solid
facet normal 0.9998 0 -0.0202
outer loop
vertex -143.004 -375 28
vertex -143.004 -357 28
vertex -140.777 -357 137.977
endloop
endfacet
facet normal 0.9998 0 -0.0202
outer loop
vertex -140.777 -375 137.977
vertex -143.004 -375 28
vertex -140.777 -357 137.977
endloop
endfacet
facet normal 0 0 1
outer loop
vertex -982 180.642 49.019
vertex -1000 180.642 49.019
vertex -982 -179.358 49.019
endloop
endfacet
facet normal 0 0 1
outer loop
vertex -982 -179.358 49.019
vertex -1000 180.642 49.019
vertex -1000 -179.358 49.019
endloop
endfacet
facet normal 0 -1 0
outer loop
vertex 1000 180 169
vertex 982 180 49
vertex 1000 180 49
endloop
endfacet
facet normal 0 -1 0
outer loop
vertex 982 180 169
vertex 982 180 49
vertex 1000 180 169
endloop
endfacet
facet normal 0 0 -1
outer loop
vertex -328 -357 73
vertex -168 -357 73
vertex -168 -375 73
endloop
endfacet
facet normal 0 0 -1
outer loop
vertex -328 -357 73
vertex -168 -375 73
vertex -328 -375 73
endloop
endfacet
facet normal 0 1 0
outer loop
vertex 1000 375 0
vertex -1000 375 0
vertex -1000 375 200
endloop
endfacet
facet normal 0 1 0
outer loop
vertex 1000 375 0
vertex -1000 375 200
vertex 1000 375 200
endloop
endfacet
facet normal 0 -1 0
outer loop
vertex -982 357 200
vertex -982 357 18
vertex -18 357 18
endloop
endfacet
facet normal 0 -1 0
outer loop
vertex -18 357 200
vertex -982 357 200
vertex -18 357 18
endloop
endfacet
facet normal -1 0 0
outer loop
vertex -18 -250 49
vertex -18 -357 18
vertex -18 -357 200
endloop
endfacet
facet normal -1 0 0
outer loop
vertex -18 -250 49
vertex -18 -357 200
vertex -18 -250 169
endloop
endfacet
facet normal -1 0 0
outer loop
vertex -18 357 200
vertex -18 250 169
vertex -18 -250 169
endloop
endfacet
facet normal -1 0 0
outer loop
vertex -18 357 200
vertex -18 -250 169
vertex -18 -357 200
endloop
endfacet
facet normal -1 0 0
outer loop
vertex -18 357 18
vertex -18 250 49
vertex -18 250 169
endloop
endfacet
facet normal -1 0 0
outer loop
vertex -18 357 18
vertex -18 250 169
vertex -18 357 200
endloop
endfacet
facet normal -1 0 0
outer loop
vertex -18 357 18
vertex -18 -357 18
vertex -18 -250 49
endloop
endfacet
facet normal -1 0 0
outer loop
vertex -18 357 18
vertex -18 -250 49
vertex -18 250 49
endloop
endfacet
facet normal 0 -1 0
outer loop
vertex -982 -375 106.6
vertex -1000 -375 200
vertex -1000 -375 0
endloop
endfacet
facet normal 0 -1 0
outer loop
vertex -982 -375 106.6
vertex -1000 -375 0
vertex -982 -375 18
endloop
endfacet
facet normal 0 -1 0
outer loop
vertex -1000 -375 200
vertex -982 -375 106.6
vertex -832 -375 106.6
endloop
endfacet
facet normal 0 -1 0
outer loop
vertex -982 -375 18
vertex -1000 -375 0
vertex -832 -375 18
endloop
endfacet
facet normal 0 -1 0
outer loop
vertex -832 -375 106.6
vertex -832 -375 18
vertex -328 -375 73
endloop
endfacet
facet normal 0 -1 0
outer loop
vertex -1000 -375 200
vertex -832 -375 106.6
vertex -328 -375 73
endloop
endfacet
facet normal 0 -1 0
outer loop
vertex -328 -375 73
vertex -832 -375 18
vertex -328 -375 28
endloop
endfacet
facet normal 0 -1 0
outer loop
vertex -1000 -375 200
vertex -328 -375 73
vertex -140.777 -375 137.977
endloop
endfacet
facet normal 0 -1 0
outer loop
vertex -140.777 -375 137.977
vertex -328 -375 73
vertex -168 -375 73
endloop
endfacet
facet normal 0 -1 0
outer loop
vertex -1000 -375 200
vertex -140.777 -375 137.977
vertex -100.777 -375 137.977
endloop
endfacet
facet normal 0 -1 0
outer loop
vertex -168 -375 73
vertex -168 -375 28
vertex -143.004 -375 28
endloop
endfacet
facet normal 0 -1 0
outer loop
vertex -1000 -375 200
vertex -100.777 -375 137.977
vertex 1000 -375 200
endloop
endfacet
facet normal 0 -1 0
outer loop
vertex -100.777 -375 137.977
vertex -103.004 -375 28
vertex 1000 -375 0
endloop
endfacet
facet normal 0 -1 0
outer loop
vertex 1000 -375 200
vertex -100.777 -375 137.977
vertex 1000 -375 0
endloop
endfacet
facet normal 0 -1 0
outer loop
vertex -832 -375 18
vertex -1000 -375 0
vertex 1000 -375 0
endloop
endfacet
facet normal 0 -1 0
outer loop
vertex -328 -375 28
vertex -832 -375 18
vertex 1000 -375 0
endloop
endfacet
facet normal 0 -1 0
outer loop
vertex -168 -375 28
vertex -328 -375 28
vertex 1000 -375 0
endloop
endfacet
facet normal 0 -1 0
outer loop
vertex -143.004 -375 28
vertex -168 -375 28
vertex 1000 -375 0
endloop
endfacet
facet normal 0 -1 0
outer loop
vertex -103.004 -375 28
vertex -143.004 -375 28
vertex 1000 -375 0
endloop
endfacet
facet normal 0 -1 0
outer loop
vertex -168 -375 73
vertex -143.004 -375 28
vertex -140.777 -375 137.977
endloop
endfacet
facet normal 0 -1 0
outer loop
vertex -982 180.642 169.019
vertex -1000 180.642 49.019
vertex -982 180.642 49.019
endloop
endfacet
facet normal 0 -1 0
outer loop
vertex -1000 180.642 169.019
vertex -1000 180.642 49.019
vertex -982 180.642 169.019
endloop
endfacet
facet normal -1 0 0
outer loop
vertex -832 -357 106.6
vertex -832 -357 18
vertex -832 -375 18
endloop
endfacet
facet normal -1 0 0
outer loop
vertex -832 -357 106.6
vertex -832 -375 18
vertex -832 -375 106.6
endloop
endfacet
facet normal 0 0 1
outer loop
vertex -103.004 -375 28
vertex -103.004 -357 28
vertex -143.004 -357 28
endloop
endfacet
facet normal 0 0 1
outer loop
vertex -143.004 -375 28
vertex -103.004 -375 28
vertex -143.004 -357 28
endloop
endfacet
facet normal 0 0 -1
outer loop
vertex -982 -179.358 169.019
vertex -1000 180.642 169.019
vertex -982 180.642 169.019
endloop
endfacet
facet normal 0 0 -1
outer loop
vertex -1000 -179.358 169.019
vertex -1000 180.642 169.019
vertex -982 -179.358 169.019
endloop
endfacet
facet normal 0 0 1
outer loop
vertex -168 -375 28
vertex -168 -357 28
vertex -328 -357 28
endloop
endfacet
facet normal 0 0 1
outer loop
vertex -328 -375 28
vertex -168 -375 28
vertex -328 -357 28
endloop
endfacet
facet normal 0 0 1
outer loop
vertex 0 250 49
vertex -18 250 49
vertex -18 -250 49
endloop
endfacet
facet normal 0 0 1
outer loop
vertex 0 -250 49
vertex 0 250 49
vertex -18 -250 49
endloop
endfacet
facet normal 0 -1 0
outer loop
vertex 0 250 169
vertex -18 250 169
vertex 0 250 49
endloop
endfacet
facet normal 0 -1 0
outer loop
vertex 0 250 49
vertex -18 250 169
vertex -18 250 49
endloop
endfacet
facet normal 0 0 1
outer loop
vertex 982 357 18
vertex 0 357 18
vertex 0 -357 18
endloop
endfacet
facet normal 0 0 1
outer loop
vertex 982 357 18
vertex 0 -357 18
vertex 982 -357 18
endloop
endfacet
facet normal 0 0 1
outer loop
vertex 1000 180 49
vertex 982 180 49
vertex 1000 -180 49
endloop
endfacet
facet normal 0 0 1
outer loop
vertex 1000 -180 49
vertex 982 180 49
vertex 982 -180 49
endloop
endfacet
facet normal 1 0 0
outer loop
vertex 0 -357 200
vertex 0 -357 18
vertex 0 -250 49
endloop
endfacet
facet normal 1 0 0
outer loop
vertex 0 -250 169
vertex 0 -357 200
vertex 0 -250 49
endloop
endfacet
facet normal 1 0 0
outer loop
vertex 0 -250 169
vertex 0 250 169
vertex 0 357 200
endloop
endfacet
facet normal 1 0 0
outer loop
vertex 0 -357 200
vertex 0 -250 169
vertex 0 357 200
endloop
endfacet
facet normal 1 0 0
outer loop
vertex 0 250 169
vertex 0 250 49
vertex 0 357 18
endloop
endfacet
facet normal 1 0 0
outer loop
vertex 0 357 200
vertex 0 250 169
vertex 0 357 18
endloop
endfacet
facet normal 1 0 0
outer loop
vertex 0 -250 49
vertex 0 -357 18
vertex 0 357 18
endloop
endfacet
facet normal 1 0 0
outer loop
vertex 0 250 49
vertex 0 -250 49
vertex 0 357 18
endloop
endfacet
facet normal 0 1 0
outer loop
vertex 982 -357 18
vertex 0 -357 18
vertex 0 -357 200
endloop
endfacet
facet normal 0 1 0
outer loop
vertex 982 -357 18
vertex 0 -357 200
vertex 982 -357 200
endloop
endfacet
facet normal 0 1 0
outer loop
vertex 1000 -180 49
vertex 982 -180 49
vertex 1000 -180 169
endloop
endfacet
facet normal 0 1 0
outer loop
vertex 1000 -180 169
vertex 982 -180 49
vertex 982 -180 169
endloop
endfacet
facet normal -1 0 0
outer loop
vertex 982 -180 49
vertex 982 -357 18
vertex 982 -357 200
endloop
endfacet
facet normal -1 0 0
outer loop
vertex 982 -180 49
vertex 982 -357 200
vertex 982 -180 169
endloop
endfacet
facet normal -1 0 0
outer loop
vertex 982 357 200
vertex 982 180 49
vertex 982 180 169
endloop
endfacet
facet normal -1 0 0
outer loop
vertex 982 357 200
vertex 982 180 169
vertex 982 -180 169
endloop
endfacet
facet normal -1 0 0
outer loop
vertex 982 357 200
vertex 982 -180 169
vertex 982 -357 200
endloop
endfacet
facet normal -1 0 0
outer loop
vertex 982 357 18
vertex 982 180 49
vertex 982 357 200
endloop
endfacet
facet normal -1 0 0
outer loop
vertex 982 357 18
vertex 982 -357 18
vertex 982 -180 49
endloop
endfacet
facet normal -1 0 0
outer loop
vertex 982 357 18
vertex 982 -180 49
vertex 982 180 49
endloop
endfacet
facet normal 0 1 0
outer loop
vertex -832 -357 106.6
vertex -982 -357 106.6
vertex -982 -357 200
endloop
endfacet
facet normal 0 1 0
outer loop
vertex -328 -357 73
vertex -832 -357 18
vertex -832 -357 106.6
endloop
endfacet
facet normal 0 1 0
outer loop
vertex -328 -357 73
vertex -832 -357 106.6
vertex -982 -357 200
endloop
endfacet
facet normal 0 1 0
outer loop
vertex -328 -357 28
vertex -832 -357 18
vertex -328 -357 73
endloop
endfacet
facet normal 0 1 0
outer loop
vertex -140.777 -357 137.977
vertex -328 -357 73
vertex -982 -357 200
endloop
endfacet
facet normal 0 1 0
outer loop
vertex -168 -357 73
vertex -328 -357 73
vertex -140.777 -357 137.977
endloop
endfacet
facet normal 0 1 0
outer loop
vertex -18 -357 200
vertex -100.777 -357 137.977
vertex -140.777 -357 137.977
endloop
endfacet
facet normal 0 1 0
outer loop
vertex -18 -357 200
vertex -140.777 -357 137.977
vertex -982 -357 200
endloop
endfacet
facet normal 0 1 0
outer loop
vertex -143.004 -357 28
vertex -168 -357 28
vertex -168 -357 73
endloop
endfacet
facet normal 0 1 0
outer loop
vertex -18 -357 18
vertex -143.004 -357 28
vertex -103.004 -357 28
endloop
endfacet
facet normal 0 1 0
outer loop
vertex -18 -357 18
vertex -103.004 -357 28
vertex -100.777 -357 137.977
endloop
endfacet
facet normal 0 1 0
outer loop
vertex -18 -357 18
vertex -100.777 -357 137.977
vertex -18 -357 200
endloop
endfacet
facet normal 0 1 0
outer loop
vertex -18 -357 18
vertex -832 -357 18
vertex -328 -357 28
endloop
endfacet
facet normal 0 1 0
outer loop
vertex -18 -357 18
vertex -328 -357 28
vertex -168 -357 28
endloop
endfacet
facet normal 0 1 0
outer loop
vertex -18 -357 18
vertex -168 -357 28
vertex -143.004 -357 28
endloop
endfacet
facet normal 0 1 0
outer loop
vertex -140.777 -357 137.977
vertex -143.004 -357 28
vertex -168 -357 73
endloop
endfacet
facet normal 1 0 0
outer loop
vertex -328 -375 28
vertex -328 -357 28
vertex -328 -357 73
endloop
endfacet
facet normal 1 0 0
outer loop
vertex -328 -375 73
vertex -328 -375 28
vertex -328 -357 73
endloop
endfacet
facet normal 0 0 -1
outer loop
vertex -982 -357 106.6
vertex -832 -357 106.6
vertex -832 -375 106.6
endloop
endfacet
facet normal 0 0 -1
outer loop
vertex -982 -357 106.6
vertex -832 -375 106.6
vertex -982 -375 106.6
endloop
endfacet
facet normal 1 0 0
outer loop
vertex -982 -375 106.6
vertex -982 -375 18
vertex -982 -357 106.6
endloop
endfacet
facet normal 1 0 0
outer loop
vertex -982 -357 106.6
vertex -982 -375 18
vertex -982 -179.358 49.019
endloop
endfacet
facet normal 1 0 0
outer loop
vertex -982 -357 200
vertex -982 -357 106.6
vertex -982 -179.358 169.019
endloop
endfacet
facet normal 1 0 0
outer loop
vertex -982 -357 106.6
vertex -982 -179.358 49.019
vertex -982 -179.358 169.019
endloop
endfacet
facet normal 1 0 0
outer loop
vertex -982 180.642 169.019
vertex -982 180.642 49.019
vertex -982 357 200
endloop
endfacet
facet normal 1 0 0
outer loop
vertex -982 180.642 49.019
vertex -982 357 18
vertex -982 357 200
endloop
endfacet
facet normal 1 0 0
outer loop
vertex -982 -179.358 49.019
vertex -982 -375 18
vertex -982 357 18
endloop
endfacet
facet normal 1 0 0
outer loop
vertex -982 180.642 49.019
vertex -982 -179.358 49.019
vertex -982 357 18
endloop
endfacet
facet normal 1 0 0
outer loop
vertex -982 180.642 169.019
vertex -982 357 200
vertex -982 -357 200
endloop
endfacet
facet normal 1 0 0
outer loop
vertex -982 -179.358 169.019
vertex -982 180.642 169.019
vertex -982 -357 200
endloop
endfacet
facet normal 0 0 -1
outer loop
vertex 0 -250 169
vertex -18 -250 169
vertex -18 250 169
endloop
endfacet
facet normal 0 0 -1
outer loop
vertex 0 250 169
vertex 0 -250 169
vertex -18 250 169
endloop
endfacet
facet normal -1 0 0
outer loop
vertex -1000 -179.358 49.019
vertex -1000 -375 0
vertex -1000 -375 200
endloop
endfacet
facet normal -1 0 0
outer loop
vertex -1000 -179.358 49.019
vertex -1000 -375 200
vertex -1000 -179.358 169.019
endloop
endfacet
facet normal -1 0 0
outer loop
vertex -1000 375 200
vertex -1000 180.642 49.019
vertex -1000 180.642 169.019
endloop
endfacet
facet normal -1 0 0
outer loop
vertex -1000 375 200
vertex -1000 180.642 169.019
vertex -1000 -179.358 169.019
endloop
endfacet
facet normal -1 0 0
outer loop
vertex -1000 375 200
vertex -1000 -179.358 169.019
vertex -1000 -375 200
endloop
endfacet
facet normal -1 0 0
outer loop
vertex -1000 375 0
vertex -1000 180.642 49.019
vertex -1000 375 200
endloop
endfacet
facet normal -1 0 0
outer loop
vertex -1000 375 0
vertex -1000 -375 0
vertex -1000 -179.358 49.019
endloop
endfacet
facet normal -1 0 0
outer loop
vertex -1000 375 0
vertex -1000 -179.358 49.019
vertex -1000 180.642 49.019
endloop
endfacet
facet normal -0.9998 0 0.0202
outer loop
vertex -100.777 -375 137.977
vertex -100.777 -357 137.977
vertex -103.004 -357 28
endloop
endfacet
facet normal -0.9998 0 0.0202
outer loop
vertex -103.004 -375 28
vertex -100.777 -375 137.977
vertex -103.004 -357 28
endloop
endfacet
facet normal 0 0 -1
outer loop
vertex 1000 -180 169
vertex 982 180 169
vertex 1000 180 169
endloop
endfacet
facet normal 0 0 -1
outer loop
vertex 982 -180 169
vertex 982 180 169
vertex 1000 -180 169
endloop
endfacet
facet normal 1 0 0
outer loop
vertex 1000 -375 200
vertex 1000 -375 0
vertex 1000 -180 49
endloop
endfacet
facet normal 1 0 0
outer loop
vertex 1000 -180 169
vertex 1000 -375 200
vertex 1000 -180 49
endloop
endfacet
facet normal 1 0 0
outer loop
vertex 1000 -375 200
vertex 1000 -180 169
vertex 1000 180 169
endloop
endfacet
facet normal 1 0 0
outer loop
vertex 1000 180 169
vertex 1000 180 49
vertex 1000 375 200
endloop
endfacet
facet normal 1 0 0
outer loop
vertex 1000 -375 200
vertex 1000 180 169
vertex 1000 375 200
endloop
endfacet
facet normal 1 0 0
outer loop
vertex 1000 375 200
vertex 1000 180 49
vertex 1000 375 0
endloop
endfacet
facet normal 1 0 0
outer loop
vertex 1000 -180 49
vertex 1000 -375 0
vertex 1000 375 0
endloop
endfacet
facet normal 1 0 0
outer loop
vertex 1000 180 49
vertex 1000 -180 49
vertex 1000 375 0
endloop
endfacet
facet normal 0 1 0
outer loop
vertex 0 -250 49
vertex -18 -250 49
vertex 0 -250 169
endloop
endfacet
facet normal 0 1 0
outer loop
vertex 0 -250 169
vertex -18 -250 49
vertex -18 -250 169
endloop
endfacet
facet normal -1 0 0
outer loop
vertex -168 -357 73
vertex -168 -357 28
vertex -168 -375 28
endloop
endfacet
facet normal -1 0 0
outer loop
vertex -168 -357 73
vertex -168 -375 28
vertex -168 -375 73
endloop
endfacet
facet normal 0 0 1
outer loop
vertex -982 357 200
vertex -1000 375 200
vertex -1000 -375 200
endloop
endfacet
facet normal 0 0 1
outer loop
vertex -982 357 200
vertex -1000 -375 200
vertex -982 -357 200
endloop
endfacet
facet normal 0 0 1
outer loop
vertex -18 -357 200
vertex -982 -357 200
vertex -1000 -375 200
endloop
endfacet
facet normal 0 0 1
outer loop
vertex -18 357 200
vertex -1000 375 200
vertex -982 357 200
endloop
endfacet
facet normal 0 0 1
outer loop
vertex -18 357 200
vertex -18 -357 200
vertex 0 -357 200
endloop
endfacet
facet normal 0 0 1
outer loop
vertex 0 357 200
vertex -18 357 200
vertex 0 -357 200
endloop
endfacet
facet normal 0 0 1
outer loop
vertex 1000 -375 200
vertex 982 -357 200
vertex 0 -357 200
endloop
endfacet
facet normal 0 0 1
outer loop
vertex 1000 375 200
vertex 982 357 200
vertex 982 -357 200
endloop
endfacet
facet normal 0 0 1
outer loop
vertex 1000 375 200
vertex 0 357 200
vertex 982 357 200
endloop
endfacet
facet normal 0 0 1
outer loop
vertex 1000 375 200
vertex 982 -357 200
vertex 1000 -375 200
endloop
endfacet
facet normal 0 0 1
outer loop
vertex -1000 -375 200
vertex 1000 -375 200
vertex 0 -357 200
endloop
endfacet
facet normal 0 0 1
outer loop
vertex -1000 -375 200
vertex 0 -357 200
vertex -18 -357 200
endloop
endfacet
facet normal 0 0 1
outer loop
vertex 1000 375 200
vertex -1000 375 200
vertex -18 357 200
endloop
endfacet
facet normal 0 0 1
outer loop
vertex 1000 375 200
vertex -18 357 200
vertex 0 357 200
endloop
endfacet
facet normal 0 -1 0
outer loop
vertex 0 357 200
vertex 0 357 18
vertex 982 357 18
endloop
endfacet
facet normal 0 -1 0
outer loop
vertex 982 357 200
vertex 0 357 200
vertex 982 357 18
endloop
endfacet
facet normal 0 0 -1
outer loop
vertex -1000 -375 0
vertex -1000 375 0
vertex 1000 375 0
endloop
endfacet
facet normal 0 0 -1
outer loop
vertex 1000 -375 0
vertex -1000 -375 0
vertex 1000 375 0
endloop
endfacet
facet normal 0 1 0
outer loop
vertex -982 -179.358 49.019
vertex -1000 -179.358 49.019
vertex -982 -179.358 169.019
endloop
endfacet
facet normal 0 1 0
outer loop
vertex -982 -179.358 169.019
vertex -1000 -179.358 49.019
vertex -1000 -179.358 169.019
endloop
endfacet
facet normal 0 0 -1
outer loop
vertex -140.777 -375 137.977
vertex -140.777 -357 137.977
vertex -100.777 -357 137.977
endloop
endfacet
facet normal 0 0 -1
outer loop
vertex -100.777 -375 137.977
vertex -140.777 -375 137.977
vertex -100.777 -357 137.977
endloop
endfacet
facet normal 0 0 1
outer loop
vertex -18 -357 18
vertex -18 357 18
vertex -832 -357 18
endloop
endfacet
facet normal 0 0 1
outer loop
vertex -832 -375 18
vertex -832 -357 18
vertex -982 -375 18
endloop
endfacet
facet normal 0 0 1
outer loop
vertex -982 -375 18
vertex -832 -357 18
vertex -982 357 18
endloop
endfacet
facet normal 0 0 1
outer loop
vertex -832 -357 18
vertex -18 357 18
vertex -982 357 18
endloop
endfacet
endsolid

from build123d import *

# Parameters (mm, degrees)
F0_W       = 2000
F0_H       = 750
F1_DEPTH   = 200
F2_T       = -18
F3_W       = 18
F3_H       = 714
F4_DEPTH   = 182
F6_DEPTH   = 25
F7_W       = 150
F7_H       = 88.6
F7_W_2     = 160
F7_H_2     = 45
F8_DEPTH   = 25
F9_DEPTH   = 25
F10_DEPTH  = 25
F11_W      = 360
F11_H      = 120
F12_DEPTH  = 25
F12_FACE_W = 360
F12_FACE_H = 120
F13_DEPTH  = 25
F14_DEPTH  = 25
F15_W      = 360
F15_H      = 120
F16_DEPTH  = 20


with BuildPart() as f1:
    # F0 (on Top) → F1 (new body)
    with BuildSketch(Plane.XY):
        Rectangle(F0_W, F0_H)
    extrude(amount=F1_DEPTH)

    # F2
    f2_openings = [f1.faces().sort_by_distance(p)[0] for p in [
        (0, 0, 200),
    ]]
    offset(amount=F2_T, openings=f2_openings)

    # F3 (on face) → F4 (join)
    with BuildSketch(Plane.XY.offset(18)):
        with Locations((-9, 0)):
            Rectangle(F3_W, F3_H)
    extrude(amount=F4_DEPTH)

    # F5 (on face) → F6 (cut)
    with BuildSketch(Plane(origin=(-18, 0, 0), x_dir=(0, -1, 0), z_dir=(-1, 0, 0))):
        Polygon((250, 169), (0, 169), (-250, 169), (-250, 49), (250, 49), align=None)
    extrude(amount=-F6_DEPTH, mode=Mode.SUBTRACT)

    # F7 (on face) → F8 (cut)
    with BuildSketch(Plane(origin=(0, -357, 0), x_dir=(-1, 0, 0), z_dir=(0, 1, 0))):
        with Locations((907, 62.3)):
            Rectangle(F7_W, F7_H)
        Polygon((103.00435, 28), (143.00435, 28), (140.777453, 137.977456), (100.777453, 137.977456), align=None)
        with Locations((248, 50.5)):
            Rectangle(F7_W_2, F7_H_2)
    extrude(amount=-F8_DEPTH, mode=Mode.SUBTRACT)

    # F7 (on face) → F9 (cut)
    with BuildSketch(Plane(origin=(0, -357, 0), x_dir=(-1, 0, 0), z_dir=(0, 1, 0))):
        with Locations((907, 62.3)):
            Rectangle(F7_W, F7_H)
        Polygon((103.00435, 28), (143.00435, 28), (140.777453, 137.977456), (100.777453, 137.977456), align=None)
        with Locations((248, 50.5)):
            Rectangle(F7_W_2, F7_H_2)
    extrude(amount=-F9_DEPTH, mode=Mode.SUBTRACT)

    # F7 (on face) → F10 (cut)
    with BuildSketch(Plane(origin=(0, -357, 0), x_dir=(-1, 0, 0), z_dir=(0, 1, 0))):
        with Locations((907, 62.3)):
            Rectangle(F7_W, F7_H)
        Polygon((103.00435, 28), (143.00435, 28), (140.777453, 137.977456), (100.777453, 137.977456), align=None)
        with Locations((248, 50.5)):
            Rectangle(F7_W_2, F7_H_2)
    extrude(amount=-F10_DEPTH, mode=Mode.SUBTRACT)

    # F11 (on face) → F12 (join)
    with BuildSketch(Plane(origin=(982, 0, 0), x_dir=(0, -1, 0), z_dir=(-1, 0, 0))):
        with Locations((0, 109)):
            Rectangle(F11_W, F11_H)
    extrude(amount=F12_DEPTH)

    # F12_face (on face) → F13 (cut)
    with BuildSketch(Plane(origin=(957, 0, 109), x_dir=(0, -1, 0), z_dir=(-1, 0, 0))):
        Rectangle(F12_FACE_W, F12_FACE_H)
    extrude(amount=-F13_DEPTH, mode=Mode.SUBTRACT)

    # F11 (on face) → F14 (cut)
    with BuildSketch(Plane(origin=(982, 0, 0), x_dir=(0, -1, 0), z_dir=(-1, 0, 0))):
        with Locations((0, 109)):
            Rectangle(F11_W, F11_H)
    extrude(amount=-F14_DEPTH, mode=Mode.SUBTRACT)

    # F15 (on face) → F16 (cut)
    with BuildSketch(Plane(origin=(-1000, 0, 0), x_dir=(0, -1, 0), z_dir=(-1, 0, 0))):
        with Locations((-0.642158, 109.018745)):
            Rectangle(F15_W, F15_H)
    extrude(amount=-F16_DEPTH, mode=Mode.SUBTRACT)


solid = f1.part
